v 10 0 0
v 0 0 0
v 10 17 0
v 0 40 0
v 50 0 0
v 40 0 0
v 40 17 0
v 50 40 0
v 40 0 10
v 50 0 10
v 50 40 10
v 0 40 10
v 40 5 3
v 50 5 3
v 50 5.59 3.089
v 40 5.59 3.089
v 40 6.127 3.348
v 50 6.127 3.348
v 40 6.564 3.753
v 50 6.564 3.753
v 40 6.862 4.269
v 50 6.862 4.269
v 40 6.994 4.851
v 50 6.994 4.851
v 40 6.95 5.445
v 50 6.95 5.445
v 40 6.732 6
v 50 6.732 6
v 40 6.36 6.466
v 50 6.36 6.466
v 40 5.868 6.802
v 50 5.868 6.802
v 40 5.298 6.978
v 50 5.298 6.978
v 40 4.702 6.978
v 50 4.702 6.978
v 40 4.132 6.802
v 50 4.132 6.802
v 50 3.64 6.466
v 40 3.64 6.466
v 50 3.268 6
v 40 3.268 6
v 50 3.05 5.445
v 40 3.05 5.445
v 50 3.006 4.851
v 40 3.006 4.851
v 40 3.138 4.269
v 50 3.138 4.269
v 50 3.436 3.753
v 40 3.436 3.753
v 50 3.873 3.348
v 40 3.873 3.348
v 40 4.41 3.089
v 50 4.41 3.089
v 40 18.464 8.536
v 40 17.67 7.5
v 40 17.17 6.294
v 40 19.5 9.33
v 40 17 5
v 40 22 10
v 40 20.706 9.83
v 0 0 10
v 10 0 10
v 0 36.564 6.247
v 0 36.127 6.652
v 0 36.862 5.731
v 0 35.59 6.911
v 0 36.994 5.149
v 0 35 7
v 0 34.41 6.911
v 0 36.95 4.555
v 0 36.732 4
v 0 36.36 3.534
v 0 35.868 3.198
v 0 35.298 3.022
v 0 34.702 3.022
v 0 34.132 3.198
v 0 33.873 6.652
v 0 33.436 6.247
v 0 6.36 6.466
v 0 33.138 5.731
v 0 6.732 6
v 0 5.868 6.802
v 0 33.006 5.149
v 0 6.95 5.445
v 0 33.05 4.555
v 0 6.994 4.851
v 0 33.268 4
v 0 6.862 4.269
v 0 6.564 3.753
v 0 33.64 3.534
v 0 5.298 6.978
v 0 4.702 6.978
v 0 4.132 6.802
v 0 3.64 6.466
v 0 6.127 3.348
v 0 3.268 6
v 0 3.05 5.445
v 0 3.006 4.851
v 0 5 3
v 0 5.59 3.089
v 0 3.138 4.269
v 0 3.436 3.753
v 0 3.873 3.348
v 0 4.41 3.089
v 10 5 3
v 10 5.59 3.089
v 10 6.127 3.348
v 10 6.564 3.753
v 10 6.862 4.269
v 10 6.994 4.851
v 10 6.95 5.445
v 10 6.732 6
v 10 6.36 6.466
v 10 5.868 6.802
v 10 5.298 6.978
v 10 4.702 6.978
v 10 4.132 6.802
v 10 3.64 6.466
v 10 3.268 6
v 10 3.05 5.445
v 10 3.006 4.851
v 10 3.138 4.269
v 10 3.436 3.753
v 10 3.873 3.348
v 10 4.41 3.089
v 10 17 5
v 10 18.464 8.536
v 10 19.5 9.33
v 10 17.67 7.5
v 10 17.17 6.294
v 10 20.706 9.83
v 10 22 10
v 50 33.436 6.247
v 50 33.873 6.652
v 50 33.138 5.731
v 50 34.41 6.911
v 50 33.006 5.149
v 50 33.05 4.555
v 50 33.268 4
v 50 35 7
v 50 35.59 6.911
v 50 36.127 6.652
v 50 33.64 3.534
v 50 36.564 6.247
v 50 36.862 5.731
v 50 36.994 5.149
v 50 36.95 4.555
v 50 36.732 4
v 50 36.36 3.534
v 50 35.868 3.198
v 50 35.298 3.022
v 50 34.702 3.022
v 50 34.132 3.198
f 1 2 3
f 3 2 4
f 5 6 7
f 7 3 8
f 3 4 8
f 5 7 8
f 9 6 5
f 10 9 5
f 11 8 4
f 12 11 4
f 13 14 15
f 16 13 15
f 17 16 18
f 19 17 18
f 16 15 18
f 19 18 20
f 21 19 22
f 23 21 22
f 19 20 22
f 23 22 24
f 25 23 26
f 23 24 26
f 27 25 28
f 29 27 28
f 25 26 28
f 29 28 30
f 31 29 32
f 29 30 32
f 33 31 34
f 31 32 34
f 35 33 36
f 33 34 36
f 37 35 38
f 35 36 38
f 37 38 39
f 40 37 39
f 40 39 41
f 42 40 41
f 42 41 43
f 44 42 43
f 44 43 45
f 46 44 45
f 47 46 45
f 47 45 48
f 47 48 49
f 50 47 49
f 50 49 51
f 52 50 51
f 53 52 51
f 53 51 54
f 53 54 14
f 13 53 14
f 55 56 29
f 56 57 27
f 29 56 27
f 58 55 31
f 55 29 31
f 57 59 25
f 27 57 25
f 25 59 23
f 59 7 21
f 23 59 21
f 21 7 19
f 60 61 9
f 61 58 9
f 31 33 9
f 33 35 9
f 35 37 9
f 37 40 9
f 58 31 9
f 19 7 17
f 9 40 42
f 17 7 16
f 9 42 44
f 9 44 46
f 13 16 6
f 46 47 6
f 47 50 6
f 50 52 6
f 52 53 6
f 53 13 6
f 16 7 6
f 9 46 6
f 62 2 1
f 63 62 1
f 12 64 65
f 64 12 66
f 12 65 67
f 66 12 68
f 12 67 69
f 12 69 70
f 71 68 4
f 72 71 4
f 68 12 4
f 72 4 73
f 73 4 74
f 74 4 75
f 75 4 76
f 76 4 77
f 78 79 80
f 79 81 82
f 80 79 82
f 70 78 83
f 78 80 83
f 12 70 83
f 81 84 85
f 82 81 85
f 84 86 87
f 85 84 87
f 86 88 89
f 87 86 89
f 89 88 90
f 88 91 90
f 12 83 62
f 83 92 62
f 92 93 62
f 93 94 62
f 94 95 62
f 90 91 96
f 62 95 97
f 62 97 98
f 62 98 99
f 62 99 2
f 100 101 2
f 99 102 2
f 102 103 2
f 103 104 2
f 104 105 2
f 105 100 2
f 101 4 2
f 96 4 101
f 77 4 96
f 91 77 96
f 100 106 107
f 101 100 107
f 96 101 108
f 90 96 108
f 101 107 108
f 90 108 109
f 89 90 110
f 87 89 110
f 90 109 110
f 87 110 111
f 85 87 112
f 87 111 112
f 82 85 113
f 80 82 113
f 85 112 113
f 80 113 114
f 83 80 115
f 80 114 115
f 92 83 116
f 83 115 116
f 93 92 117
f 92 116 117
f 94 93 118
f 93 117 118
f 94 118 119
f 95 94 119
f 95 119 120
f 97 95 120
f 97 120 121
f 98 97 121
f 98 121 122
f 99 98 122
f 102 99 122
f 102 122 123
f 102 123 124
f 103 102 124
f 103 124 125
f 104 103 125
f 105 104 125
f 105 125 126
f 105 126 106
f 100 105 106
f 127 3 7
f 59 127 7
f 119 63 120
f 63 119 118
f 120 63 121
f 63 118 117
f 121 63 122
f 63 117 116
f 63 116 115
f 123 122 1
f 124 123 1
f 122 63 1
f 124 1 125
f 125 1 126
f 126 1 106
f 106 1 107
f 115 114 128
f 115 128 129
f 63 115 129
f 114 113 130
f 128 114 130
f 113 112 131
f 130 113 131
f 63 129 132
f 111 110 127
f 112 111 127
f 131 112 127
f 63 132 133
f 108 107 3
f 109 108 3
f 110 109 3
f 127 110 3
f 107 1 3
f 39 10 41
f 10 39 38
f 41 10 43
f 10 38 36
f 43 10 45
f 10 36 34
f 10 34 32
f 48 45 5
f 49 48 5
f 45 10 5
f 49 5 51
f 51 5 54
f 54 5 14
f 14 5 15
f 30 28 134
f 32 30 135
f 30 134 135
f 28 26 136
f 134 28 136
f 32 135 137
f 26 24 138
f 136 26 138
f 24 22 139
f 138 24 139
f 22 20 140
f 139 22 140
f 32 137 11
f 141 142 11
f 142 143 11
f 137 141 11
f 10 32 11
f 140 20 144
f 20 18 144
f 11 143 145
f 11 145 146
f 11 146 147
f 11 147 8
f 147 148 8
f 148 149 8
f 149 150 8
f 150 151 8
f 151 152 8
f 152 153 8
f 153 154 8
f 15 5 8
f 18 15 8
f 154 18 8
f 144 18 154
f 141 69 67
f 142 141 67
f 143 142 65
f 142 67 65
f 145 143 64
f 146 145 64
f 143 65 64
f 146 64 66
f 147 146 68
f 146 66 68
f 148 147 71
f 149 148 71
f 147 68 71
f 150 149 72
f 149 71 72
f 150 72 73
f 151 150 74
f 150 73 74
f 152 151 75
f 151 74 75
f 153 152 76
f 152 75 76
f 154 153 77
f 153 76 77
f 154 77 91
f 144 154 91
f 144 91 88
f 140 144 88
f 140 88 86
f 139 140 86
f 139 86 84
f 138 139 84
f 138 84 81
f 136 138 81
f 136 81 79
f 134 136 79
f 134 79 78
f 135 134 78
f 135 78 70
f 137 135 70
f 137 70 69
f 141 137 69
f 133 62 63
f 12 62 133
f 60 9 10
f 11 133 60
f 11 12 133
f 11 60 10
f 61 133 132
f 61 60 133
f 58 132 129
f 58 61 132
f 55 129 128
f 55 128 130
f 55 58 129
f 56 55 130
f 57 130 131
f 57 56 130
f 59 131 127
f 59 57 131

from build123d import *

# Parameters (mm, degrees)
BOSS_EXTRUDE1_DEPTH = 10
SKETCH2_R           = 2
CUT_EXTRUDE1_DEPTH  = 65.807406984
FILLET1_R           = 5
SKETCH3_R           = 2
CUT_EXTRUDE2_DEPTH  = 65.807406984


with BuildPart() as part:
    # Sketch1 → Boss-Extrude1 (new body)
    with BuildSketch(Plane.XY):
        Polygon((40, 0), (50, 0), (50, 40), (0, 40), (0, 0), (10, 0), (10, 17), (40, 17), align=None)
    extrude(amount=BOSS_EXTRUDE1_DEPTH)

    # Sketch2 → Cut-Extrude1 (cut, through all)
    with BuildSketch(Plane(origin=(50, 0, 0), x_dir=(0, 0, -1), z_dir=(1, 0, 0))):
        with Locations((-5, 5)):
            Circle(SKETCH2_R)
    extrude(amount=-CUT_EXTRUDE1_DEPTH, mode=Mode.SUBTRACT)

    # Fillet1
    fillet1_edges = [part.edges().sort_by_distance(p)[0] for p in [
        (25, 17, 10),
    ]]
    fillet(fillet1_edges, radius=FILLET1_R)

    # Sketch3 → Cut-Extrude2 (cut, through all)
    with BuildSketch(Plane.ZY):
        with Locations((5, 35)):
            Circle(SKETCH3_R)
    extrude(amount=-CUT_EXTRUDE2_DEPTH, mode=Mode.SUBTRACT)


solid = part.part
